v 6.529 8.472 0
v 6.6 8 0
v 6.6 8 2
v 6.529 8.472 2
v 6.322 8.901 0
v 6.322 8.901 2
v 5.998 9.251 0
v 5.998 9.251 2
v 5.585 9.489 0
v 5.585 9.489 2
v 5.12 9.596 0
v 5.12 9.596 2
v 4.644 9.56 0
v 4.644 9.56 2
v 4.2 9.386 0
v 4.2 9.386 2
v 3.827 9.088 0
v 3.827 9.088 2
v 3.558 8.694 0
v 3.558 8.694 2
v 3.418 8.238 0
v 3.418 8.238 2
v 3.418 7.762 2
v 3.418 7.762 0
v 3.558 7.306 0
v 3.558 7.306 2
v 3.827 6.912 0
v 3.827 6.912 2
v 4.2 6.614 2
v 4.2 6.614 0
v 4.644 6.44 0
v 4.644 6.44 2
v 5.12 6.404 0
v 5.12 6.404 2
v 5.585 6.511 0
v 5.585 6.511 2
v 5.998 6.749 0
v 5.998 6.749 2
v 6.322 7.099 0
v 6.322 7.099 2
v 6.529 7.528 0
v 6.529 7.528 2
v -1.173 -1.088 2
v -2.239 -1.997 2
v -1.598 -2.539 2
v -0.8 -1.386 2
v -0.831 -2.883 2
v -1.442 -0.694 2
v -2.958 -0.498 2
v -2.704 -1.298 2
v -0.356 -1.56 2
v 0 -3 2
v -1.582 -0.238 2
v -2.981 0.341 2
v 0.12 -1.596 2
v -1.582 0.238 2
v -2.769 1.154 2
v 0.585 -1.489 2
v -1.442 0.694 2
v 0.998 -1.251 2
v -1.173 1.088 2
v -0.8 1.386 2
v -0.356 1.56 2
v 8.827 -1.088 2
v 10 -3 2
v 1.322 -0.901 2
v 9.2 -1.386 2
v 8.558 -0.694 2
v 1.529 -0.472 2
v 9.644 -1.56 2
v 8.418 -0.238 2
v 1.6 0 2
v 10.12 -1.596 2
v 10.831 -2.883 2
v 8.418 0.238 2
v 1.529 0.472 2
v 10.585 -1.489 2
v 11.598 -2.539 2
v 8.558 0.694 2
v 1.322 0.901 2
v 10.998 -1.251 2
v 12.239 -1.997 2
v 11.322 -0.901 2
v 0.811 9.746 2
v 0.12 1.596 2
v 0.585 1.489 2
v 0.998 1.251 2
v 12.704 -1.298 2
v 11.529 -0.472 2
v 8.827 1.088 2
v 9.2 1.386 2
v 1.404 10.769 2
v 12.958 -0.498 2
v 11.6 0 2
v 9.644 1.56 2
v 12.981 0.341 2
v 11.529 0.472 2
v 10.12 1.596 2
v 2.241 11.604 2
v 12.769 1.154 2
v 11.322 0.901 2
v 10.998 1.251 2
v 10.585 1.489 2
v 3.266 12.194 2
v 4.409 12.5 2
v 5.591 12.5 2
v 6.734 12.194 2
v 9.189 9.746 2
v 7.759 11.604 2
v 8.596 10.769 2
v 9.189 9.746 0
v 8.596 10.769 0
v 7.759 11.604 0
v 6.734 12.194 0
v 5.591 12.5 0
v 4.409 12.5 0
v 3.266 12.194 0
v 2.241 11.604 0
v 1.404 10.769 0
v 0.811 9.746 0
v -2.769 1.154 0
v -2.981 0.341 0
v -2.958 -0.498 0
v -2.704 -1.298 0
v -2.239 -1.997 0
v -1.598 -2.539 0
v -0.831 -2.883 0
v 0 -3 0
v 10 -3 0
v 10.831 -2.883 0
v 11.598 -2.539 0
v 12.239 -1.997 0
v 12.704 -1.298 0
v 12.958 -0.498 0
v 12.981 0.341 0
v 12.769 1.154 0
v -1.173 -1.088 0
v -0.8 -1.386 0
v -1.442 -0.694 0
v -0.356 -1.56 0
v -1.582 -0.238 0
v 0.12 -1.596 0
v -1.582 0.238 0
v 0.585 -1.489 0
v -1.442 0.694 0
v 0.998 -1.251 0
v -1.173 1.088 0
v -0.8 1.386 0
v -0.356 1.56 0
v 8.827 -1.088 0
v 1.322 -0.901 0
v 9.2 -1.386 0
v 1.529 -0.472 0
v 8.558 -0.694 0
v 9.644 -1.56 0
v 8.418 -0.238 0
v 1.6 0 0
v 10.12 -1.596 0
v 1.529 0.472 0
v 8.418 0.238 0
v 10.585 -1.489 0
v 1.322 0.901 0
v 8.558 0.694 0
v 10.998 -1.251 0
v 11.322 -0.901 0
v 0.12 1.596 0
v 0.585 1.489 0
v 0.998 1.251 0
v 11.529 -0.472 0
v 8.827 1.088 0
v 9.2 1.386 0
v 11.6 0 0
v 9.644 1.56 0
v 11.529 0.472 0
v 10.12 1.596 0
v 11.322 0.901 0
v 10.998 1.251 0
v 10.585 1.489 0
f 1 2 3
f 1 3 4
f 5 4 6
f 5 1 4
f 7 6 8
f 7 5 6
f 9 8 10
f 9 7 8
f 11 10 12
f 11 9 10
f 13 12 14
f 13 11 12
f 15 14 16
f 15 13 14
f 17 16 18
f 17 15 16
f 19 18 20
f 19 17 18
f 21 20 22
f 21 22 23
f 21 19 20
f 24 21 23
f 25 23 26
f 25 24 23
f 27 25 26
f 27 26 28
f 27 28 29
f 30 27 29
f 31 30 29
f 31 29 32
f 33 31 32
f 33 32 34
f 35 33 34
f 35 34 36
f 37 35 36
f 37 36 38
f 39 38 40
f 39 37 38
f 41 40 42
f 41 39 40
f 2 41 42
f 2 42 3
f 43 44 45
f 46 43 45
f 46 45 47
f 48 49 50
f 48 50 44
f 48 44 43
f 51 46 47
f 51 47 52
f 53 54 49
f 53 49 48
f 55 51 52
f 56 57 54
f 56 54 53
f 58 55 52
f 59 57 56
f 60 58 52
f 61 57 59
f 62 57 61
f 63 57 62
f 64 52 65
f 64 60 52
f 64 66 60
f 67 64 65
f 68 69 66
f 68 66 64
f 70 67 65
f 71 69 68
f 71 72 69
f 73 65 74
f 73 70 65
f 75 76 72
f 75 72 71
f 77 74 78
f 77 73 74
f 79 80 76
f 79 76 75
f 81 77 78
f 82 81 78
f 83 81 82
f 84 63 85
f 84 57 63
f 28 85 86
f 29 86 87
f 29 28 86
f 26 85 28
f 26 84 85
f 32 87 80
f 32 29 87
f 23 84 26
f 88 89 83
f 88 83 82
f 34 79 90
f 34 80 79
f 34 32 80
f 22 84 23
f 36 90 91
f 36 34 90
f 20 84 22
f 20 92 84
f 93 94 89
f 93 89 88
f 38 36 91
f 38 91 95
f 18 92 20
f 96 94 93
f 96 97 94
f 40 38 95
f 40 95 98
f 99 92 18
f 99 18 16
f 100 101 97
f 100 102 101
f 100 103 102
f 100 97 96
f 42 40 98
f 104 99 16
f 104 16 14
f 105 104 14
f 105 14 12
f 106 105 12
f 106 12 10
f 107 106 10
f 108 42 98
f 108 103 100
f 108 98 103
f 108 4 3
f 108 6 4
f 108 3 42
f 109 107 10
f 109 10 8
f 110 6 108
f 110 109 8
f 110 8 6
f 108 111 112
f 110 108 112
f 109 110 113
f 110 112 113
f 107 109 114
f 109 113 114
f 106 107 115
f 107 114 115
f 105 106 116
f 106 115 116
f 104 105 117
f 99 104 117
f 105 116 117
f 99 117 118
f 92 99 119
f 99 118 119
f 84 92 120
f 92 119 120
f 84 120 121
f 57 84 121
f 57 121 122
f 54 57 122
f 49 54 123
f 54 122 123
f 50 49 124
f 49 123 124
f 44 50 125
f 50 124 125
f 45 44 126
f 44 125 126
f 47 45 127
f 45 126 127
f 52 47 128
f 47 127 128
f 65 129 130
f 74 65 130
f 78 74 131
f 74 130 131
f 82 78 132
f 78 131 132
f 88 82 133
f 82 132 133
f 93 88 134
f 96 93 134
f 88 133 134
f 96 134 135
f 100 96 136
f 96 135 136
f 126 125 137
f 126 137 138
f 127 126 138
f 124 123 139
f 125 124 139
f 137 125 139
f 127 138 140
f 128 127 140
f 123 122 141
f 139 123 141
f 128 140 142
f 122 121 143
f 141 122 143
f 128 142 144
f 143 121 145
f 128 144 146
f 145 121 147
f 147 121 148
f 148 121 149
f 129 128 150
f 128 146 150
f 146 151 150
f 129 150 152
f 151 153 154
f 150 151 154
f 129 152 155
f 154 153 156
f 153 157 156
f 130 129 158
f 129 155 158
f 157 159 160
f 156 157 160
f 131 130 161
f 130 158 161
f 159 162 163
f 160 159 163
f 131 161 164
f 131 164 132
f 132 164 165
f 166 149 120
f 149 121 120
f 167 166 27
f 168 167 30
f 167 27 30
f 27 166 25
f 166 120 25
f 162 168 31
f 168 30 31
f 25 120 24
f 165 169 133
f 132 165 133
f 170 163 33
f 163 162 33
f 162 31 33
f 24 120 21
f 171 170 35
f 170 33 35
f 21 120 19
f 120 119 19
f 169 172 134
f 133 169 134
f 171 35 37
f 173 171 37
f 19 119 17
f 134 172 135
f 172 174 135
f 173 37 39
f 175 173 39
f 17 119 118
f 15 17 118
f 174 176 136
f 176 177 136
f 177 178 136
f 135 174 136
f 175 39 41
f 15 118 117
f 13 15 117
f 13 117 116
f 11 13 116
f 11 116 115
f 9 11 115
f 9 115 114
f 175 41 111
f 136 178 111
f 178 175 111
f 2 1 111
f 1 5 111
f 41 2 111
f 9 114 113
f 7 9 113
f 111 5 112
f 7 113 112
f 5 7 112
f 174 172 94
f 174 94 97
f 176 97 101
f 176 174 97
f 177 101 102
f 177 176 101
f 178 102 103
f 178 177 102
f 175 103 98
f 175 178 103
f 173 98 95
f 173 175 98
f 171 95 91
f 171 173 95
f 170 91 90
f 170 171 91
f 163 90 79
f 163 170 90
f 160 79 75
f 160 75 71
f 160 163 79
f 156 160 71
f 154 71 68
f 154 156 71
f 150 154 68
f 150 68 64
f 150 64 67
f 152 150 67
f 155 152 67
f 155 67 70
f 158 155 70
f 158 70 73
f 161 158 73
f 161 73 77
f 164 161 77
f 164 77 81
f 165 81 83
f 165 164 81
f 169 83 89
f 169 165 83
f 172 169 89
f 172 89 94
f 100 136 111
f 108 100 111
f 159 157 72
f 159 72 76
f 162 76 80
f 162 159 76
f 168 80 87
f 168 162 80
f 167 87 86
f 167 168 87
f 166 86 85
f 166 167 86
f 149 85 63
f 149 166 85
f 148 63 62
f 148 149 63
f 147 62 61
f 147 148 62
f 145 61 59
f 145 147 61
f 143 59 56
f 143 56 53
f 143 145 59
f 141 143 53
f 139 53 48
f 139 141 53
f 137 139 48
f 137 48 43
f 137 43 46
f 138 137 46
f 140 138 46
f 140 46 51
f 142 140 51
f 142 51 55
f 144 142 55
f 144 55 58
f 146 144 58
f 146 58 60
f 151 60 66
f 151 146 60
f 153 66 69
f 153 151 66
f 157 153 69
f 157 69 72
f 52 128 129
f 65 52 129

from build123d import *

# Parameters (mm, degrees)
SKETCH1_R           = 1.6
BOSS_EXTRUDE2_DEPTH = 2


with BuildPart() as part:
    # Sketch1 → Boss-Extrude2 (new body)
    with BuildSketch(Plane.XY):
        with BuildLine():
            Line((0, -3), (9.999997972, -3))
            ThreePointArc((9.999997972, -3), (12.496148784, -1.664100694), (12.769228838, 1.15384592))
            Line((12.769228838, 1.15384592), (9.189348108, 9.745561719))
            ThreePointArc((9.189348108, 9.745561719), (4.999998986, 12.538461389), (0.810649864, 9.745561719))
            Line((0.810649864, 9.745561719), (-2.769230867, 1.15384592))
            ThreePointArc((-2.769230867, 1.15384592), (-2.496150813, -1.664100694), (0, -3))
        make_face()
        with Locations((9.999997972, 0)):
            Circle(SKETCH1_R, mode=Mode.SUBTRACT)
        Circle(SKETCH1_R, mode=Mode.SUBTRACT)
        with Locations((4.999998986, 8)):
            Circle(SKETCH1_R, mode=Mode.SUBTRACT)
    extrude(amount=BOSS_EXTRUDE2_DEPTH)


solid = part.part
